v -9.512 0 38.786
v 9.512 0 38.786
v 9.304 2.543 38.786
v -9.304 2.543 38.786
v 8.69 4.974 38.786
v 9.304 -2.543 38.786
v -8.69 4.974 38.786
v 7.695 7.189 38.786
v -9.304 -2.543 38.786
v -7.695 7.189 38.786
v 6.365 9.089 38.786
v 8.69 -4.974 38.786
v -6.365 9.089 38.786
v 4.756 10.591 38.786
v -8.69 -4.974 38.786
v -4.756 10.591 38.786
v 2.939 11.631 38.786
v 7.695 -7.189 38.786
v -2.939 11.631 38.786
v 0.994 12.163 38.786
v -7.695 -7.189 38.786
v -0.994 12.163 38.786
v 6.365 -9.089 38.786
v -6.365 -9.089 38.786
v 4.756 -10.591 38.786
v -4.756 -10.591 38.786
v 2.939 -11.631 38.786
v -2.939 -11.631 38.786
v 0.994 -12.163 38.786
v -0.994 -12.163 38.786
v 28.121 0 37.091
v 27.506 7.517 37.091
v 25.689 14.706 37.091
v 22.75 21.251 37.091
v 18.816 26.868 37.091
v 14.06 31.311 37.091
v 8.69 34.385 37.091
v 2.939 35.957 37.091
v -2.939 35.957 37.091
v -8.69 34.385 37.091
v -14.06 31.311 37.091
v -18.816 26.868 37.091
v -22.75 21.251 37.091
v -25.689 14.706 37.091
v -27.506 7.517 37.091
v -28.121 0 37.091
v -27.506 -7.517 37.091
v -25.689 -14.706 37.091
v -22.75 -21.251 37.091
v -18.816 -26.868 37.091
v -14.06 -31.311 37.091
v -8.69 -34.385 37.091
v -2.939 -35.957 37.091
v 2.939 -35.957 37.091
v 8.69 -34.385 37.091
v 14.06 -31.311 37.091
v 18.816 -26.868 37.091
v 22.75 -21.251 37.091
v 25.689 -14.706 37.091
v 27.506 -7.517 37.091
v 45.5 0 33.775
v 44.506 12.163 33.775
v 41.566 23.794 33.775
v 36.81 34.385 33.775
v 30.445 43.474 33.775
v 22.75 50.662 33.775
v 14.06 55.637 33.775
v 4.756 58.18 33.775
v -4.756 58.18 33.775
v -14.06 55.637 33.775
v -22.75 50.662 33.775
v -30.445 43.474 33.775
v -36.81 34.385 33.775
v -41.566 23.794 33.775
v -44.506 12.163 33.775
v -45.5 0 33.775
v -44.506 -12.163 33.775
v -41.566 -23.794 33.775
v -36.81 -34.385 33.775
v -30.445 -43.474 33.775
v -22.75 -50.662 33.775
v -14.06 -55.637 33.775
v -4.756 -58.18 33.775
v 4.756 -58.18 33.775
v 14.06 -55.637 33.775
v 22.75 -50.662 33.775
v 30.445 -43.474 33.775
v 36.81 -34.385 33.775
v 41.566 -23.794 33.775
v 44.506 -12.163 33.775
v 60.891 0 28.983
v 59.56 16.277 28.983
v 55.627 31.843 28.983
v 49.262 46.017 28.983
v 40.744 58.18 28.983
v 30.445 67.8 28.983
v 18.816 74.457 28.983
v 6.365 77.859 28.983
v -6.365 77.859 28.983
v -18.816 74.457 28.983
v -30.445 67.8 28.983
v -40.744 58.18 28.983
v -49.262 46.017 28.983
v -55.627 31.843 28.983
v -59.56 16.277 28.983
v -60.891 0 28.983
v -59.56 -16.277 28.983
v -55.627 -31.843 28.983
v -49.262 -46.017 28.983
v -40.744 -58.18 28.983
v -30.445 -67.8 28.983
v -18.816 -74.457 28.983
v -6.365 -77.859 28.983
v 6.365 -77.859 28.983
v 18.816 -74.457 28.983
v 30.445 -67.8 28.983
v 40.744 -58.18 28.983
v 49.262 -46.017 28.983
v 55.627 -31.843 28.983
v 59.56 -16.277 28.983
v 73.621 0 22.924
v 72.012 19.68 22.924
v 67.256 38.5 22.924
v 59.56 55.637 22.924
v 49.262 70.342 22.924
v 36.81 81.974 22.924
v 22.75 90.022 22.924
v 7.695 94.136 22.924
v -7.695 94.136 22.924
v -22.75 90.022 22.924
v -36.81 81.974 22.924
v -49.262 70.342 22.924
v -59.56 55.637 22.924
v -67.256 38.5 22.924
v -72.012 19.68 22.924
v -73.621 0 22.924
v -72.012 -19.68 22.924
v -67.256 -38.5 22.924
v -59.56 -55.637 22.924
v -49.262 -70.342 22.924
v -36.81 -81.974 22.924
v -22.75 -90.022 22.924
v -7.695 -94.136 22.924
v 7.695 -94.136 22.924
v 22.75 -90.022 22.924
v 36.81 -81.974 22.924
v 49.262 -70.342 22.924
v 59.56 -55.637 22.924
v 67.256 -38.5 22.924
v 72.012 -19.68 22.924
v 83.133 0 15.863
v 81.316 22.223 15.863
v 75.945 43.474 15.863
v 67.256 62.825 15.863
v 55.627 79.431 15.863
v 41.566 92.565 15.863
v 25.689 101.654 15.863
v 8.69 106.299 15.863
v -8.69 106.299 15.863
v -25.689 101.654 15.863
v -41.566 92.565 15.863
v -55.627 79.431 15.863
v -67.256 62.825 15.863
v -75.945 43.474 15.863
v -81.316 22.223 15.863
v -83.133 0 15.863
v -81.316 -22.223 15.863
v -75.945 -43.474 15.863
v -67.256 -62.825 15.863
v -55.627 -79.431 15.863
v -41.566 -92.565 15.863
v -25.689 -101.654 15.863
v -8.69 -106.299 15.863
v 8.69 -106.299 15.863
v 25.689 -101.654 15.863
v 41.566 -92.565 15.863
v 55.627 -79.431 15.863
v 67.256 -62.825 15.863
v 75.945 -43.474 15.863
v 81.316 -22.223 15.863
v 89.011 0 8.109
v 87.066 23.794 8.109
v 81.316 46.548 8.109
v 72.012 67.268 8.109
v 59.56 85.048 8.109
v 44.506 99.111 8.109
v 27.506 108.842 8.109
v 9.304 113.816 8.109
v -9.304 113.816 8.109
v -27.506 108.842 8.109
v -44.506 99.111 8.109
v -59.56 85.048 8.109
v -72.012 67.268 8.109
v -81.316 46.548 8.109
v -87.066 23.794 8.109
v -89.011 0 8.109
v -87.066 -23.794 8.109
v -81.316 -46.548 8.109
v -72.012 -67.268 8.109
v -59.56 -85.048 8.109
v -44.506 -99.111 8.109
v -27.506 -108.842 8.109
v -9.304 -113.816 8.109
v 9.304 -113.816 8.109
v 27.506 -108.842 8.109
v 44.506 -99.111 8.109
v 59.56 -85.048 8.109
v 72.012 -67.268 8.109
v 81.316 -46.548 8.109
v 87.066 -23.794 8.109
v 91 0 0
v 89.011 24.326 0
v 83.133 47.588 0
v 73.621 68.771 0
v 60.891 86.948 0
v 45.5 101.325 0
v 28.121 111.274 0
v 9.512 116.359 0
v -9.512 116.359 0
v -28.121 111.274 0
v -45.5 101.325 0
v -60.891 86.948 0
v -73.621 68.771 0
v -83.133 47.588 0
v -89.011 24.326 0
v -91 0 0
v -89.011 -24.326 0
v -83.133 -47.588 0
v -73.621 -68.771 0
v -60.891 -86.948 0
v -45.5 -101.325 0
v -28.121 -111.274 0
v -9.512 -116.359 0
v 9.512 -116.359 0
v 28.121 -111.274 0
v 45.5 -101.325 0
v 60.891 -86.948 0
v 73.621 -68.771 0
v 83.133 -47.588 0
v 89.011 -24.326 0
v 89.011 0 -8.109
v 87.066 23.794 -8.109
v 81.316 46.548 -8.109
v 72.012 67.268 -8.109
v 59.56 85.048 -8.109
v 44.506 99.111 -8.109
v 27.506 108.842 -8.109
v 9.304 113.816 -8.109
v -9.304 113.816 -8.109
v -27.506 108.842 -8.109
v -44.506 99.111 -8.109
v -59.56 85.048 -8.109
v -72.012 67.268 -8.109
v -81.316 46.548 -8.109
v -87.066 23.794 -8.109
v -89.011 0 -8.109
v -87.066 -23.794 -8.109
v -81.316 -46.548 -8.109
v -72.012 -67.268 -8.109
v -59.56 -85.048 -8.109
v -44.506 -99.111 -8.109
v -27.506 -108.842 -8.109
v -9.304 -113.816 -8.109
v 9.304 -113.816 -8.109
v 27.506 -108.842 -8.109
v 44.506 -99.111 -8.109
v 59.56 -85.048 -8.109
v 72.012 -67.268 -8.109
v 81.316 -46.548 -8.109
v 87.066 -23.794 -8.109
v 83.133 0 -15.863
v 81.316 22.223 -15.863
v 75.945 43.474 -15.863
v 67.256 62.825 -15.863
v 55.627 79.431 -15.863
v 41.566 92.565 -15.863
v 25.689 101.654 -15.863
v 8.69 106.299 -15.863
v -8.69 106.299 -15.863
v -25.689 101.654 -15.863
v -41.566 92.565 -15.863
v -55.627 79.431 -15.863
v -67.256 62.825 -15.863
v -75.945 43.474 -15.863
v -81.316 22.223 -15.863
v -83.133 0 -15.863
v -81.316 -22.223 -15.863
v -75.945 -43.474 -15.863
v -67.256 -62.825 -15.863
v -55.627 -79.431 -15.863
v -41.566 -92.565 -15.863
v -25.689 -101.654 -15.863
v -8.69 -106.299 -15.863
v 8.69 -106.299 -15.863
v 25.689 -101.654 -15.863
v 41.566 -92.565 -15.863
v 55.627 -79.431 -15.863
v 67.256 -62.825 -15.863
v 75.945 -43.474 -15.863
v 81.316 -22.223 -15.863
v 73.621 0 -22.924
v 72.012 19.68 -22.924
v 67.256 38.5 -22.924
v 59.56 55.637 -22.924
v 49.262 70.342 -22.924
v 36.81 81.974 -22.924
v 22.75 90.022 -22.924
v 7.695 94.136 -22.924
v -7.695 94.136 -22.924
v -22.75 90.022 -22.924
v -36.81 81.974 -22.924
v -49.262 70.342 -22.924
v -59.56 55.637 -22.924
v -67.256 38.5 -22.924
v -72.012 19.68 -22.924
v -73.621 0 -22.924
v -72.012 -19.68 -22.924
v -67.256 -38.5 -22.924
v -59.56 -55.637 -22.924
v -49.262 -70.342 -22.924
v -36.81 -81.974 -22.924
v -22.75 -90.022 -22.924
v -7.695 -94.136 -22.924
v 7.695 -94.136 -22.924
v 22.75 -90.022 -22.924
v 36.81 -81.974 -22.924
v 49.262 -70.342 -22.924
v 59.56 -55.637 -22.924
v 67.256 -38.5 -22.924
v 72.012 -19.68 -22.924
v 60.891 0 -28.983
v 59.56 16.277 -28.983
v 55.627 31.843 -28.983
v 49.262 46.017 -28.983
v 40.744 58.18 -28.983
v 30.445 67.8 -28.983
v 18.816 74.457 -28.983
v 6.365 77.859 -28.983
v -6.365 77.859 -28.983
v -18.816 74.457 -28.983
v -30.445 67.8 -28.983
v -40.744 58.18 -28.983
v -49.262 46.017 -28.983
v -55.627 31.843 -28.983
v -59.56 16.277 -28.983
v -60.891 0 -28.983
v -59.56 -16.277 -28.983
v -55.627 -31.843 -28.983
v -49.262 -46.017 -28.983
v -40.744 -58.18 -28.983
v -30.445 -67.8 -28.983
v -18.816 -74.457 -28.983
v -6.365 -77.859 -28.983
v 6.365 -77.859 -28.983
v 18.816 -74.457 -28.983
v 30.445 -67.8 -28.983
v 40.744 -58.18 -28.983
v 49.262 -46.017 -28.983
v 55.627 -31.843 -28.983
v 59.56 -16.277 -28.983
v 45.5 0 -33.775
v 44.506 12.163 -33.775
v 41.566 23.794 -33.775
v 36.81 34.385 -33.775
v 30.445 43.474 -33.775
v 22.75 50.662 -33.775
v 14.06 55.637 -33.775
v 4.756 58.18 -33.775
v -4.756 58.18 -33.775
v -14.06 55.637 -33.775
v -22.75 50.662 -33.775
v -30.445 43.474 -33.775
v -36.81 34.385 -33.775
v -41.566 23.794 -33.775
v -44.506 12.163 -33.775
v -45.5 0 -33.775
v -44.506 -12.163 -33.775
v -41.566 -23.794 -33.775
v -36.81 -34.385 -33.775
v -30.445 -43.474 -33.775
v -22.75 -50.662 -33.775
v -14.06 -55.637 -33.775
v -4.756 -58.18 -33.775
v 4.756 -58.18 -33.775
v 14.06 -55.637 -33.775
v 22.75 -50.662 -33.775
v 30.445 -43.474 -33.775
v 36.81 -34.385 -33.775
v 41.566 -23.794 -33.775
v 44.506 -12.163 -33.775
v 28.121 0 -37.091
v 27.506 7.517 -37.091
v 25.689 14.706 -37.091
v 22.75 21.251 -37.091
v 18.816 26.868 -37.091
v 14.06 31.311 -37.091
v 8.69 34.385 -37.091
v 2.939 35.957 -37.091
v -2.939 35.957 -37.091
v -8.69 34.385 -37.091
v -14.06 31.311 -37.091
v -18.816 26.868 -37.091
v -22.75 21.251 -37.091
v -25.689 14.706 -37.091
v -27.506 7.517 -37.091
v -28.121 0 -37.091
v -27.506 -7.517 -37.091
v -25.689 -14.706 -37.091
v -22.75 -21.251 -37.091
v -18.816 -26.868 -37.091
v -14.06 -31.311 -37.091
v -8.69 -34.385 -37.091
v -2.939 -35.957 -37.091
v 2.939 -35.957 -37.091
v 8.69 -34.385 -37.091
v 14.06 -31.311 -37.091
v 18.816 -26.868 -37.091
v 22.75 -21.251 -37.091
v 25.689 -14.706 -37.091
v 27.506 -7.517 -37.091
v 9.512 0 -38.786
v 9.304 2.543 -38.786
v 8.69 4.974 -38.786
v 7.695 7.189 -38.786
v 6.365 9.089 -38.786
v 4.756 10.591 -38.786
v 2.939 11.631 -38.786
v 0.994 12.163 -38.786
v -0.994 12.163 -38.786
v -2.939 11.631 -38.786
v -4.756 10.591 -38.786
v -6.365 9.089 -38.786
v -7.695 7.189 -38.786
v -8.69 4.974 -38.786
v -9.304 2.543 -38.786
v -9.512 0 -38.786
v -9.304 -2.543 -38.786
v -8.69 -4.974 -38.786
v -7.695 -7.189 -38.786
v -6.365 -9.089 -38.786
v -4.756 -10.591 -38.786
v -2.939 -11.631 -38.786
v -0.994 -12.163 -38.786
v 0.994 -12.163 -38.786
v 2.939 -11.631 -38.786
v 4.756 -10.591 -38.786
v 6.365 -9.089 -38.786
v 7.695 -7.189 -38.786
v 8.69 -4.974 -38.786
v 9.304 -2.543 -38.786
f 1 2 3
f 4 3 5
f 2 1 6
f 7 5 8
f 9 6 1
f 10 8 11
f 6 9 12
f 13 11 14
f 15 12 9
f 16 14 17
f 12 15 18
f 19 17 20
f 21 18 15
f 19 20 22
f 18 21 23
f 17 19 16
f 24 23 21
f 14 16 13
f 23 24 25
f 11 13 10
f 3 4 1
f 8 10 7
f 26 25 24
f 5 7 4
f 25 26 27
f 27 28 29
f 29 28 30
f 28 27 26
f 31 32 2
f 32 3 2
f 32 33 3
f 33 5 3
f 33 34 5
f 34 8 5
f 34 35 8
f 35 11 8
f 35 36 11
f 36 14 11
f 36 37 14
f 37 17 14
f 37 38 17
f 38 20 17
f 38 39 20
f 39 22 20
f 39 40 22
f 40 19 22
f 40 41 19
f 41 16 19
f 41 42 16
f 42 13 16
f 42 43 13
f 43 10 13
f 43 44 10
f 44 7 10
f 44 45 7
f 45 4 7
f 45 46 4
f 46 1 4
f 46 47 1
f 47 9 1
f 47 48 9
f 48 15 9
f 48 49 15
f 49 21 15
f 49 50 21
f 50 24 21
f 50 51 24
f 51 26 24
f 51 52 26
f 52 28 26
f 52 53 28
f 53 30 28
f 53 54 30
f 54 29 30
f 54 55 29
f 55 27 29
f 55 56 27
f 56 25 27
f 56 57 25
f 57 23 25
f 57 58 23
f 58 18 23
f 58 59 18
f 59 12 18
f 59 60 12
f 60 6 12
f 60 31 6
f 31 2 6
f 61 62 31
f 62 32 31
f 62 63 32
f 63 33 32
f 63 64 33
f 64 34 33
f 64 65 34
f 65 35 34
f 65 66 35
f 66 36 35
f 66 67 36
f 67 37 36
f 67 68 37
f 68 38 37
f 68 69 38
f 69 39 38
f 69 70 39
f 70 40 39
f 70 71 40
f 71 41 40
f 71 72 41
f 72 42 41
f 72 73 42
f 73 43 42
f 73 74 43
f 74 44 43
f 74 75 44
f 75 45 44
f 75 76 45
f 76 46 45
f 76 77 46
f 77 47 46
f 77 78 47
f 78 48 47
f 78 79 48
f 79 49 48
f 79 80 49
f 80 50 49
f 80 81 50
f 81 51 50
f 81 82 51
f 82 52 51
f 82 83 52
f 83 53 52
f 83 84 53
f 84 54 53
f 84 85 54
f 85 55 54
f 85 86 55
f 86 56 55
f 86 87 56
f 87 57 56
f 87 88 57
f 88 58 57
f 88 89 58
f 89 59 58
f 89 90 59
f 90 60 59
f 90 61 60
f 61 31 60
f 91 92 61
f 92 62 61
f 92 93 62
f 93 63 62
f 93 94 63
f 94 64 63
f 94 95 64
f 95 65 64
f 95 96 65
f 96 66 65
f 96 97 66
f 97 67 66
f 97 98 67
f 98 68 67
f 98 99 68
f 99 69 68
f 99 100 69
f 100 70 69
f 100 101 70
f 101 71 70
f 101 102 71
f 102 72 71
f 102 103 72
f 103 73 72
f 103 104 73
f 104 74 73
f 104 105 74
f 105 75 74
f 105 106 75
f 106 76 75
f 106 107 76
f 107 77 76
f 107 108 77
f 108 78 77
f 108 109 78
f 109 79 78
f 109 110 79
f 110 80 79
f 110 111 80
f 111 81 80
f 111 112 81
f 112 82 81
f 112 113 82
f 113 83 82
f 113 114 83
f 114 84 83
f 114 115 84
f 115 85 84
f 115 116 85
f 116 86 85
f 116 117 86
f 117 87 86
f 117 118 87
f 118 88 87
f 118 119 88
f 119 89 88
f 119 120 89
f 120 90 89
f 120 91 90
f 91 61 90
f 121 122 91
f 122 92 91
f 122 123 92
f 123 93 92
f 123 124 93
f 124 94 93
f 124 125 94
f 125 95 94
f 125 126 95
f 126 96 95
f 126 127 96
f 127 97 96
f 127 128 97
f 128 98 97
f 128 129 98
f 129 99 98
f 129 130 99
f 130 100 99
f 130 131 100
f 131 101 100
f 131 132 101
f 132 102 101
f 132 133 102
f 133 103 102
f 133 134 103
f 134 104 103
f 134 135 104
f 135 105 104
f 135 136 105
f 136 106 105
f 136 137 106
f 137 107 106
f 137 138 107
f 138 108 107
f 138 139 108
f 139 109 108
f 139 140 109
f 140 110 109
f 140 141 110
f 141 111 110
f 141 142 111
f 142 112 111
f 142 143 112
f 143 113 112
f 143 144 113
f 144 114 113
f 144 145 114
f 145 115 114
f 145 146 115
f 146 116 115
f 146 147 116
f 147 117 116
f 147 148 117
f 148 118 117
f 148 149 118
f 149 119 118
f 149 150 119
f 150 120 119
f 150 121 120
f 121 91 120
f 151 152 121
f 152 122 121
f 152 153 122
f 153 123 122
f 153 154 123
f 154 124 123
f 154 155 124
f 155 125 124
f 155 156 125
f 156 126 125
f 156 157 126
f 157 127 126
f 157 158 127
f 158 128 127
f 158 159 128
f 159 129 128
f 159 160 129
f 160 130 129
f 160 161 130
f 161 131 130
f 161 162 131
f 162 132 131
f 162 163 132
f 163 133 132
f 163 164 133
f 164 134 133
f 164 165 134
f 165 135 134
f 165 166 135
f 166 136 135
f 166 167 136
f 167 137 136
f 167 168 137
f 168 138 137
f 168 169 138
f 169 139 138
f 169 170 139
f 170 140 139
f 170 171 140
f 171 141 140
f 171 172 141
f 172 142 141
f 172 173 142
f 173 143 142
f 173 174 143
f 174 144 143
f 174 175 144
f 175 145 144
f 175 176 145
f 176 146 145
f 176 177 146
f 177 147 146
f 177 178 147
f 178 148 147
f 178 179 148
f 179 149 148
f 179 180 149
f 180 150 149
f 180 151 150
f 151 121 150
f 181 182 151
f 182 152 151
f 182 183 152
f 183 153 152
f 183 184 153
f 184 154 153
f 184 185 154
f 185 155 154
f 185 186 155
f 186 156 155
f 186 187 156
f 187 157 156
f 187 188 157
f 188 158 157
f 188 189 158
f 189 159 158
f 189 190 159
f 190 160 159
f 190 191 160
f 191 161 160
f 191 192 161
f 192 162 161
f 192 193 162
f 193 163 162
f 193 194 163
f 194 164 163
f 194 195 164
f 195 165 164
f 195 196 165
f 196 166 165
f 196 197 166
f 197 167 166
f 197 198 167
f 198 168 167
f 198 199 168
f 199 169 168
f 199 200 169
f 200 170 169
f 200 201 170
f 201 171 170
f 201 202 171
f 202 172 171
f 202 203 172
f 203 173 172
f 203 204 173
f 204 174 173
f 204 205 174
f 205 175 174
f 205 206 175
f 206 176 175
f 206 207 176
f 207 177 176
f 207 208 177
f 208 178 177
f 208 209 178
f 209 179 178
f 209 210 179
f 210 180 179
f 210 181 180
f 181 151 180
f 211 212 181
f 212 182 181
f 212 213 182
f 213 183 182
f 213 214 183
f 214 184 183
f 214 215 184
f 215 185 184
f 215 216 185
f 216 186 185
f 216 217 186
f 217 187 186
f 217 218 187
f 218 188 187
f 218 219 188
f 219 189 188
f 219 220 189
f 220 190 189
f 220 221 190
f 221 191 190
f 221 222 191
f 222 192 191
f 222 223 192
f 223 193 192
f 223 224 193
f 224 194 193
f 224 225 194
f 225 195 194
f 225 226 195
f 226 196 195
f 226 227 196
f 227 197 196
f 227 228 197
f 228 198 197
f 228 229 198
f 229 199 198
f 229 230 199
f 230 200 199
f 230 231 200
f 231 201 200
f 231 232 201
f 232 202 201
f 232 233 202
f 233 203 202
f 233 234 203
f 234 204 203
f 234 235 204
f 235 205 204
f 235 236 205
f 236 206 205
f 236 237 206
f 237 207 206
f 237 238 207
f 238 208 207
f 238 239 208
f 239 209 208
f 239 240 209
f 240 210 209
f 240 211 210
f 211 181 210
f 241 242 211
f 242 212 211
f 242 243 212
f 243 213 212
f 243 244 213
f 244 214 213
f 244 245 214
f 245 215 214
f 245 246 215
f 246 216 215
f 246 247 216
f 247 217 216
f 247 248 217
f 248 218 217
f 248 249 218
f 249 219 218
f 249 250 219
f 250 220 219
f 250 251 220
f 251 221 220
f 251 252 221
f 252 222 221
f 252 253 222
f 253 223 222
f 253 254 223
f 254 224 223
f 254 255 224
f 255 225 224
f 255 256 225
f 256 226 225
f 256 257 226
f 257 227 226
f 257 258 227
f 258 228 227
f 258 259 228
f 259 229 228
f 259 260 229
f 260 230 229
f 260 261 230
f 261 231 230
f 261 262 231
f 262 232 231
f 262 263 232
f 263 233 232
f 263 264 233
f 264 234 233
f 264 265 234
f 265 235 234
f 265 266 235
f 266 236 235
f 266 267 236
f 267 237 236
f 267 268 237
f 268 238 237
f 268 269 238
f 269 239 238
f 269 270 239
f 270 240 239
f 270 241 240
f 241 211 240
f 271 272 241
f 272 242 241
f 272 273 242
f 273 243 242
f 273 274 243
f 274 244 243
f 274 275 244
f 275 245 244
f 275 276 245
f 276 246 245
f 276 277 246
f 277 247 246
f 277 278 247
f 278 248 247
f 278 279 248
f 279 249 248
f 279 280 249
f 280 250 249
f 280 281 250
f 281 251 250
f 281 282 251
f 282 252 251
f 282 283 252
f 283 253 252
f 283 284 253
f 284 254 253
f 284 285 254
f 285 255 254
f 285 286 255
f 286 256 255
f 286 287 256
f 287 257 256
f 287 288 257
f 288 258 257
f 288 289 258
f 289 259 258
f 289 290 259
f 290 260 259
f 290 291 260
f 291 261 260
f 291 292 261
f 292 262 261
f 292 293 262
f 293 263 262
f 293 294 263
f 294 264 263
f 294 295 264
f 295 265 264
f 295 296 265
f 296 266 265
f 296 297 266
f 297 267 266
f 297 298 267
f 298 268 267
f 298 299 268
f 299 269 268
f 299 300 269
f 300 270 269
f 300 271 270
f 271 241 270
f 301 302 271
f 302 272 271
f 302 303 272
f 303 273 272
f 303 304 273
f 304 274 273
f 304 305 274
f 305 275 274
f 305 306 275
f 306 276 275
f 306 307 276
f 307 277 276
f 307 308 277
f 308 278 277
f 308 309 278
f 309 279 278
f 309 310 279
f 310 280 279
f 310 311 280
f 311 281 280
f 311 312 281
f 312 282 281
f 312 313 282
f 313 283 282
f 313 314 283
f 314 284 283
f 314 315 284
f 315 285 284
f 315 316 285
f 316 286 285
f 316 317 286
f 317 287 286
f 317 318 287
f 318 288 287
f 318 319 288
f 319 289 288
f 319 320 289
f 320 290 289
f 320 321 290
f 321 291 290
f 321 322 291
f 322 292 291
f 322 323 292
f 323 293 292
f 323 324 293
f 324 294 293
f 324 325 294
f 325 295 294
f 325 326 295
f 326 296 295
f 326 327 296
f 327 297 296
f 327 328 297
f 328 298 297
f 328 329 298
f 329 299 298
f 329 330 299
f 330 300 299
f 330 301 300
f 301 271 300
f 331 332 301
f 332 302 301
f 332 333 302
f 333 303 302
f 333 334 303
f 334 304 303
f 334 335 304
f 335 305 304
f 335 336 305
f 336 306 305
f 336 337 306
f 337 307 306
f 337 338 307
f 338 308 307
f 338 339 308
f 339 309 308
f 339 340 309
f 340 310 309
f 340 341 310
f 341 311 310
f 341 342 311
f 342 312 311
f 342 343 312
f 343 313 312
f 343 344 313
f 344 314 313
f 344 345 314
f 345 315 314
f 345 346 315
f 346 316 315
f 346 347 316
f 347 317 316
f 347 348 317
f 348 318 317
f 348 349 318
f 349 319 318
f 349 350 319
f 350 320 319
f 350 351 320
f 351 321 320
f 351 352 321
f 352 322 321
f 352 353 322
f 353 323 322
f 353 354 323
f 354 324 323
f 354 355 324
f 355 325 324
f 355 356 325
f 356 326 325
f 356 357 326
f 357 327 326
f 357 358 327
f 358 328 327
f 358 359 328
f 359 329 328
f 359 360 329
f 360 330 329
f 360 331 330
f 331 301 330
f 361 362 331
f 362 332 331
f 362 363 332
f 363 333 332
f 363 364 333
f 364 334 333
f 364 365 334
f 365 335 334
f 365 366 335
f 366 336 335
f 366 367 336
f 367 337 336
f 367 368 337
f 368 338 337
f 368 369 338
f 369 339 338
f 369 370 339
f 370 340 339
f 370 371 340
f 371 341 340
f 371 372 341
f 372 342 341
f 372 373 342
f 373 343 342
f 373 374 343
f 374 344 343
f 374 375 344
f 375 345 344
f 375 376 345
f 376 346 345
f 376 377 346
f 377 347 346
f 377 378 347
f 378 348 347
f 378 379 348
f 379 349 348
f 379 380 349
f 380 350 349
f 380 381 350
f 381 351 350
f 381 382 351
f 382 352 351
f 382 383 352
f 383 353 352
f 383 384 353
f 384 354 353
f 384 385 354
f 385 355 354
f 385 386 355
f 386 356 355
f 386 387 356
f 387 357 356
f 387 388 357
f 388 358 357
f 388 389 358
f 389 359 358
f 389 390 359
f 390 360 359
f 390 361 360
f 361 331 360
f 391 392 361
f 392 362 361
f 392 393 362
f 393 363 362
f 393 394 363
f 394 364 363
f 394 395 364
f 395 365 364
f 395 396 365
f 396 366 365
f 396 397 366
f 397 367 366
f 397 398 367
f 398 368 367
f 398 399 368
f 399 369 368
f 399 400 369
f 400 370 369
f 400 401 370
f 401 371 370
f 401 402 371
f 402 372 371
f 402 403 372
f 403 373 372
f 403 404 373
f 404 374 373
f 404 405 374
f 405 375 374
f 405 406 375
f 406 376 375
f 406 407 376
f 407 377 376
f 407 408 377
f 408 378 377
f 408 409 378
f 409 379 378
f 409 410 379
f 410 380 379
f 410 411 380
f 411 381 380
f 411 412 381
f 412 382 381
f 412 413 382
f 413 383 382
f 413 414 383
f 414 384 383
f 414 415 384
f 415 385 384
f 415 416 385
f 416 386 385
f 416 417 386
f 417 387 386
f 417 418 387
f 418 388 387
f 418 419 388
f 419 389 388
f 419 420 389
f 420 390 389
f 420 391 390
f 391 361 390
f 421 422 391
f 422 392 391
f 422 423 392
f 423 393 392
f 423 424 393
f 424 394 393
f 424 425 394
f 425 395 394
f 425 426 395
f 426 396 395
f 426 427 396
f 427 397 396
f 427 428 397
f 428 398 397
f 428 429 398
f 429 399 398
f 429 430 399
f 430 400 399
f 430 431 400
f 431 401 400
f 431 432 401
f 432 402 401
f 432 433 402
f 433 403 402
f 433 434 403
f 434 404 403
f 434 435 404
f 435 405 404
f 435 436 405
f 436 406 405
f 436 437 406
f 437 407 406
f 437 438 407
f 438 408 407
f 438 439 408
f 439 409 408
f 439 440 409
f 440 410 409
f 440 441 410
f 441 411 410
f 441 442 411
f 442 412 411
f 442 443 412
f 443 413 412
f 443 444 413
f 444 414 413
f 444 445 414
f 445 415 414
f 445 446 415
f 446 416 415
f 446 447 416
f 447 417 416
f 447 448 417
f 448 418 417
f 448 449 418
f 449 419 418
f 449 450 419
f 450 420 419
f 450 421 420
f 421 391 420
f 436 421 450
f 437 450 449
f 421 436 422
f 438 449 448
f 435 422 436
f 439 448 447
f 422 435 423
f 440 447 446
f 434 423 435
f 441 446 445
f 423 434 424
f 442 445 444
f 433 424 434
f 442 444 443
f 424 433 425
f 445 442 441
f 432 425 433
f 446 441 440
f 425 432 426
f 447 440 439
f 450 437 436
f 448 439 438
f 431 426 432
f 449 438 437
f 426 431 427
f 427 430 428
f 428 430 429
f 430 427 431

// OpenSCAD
// Generated by SolidPython 1.0.1 on 2020-07-29 00:46:47


scale(v = [7, 9, 3]) {
	sphere(r = 13);
}
/***********************************************
*********      SolidPython code:      **********
************************************************
 
# import packages: SolidPython
from solid import *
from solid.utils import *
from itertools import chain, combinations, permutations


class Resize:

    def __init__(self, scad_file):
        self.scad_file = scad_file
        #self.scad_file = import_scad(scad_file)
        # cone/cylinder param:
        self.r1 = 0
        self.r2 = 0
        self.h = 0
        # rectangular prism param:
        self.w = 0
        self.l = 0
        # ellipse param:
        self.r = 0

    # import OpenScad code (file name corresponds to shape)


    # classify shape + parameters
    def assign(self, param1, param2, param3):
        if self.scad_file == 'cone.scad':
            self.r1 = param1
            self.r2 = param2
            self.h = param3
        elif self.scad_file == 'cylinder.scad':
            self.r1 = param1
            self.r2 = param2
            self.h = param3
        elif self.scad_file == 'rectangularPrism.scad':
            self.h = param1
            self.l = param2
            self.w = param3
        else:
            self.r = param1
            self.h = param2

    # resize parameters
    def iterate(self):
        x = range(3, 20, 2)
        i = 1
        if self.scad_file == 'cone.scad':
            tempList = list(permutations(x, 2))
            for temp in tempList:
                param1 = temp[0]
                param2 = temp[1]
                filepath = 'produced_scad_files/' + 'cone' + str(param1) + '_' + str(param2) + '_' + '.scad'
                scad_render_to_file(cylinder(h=param1, r1=param2, r2=0), filepath)

        elif self.scad_file == 'cylinder.scad':
            tempList = list(permutations(x, 3))
            for temp in tempList:
                param1 = temp[0]
                param2 = temp[1]
                filepath = 'produced_scad_files/' + 'cylinder' + str(param1) + '_' + str(param2) + '_' + '.scad'
                scad_render_to_file(cylinder(h=param1, r1=param2, r2=param2), filepath)

        elif self.scad_file == 'rectangularPrism.scad':
            tempList = list(permutations(x, 3))
            for temp in tempList:
                param1 = temp[0]
                param2 = temp[1]
                param3 = temp[2]
                filepath = 'produced_scad_files/' + 'rectangularPrism' + str(param1) + '_' + str(param2) + '_' + str(
                    param3) + '.scad'
                scad_render_to_file(cube(size=(param1, param2, param3)), filepath)

        elif self.scad_file == 'ellipse.scad':
            tempList = list(permutations(x, 4))
            for temp in tempList:
                param1 = temp[0]
                param2 = temp[1]
                param3 = temp[2]
                param4 = temp[3]
                filepath = 'produced_scad_files/' + 'ellipse' + str(param1) + '_' + str(param2) + '_' + str(param3) + '_' + str(param4) + '.scad'
                scad_render_to_file(scale([param1, param2, param3])(sphere(r=param4)), filepath)

    def render_to_scadfile(self):
        scad_render_to_file(scad, 'example.scad') 
 
************************************************/
